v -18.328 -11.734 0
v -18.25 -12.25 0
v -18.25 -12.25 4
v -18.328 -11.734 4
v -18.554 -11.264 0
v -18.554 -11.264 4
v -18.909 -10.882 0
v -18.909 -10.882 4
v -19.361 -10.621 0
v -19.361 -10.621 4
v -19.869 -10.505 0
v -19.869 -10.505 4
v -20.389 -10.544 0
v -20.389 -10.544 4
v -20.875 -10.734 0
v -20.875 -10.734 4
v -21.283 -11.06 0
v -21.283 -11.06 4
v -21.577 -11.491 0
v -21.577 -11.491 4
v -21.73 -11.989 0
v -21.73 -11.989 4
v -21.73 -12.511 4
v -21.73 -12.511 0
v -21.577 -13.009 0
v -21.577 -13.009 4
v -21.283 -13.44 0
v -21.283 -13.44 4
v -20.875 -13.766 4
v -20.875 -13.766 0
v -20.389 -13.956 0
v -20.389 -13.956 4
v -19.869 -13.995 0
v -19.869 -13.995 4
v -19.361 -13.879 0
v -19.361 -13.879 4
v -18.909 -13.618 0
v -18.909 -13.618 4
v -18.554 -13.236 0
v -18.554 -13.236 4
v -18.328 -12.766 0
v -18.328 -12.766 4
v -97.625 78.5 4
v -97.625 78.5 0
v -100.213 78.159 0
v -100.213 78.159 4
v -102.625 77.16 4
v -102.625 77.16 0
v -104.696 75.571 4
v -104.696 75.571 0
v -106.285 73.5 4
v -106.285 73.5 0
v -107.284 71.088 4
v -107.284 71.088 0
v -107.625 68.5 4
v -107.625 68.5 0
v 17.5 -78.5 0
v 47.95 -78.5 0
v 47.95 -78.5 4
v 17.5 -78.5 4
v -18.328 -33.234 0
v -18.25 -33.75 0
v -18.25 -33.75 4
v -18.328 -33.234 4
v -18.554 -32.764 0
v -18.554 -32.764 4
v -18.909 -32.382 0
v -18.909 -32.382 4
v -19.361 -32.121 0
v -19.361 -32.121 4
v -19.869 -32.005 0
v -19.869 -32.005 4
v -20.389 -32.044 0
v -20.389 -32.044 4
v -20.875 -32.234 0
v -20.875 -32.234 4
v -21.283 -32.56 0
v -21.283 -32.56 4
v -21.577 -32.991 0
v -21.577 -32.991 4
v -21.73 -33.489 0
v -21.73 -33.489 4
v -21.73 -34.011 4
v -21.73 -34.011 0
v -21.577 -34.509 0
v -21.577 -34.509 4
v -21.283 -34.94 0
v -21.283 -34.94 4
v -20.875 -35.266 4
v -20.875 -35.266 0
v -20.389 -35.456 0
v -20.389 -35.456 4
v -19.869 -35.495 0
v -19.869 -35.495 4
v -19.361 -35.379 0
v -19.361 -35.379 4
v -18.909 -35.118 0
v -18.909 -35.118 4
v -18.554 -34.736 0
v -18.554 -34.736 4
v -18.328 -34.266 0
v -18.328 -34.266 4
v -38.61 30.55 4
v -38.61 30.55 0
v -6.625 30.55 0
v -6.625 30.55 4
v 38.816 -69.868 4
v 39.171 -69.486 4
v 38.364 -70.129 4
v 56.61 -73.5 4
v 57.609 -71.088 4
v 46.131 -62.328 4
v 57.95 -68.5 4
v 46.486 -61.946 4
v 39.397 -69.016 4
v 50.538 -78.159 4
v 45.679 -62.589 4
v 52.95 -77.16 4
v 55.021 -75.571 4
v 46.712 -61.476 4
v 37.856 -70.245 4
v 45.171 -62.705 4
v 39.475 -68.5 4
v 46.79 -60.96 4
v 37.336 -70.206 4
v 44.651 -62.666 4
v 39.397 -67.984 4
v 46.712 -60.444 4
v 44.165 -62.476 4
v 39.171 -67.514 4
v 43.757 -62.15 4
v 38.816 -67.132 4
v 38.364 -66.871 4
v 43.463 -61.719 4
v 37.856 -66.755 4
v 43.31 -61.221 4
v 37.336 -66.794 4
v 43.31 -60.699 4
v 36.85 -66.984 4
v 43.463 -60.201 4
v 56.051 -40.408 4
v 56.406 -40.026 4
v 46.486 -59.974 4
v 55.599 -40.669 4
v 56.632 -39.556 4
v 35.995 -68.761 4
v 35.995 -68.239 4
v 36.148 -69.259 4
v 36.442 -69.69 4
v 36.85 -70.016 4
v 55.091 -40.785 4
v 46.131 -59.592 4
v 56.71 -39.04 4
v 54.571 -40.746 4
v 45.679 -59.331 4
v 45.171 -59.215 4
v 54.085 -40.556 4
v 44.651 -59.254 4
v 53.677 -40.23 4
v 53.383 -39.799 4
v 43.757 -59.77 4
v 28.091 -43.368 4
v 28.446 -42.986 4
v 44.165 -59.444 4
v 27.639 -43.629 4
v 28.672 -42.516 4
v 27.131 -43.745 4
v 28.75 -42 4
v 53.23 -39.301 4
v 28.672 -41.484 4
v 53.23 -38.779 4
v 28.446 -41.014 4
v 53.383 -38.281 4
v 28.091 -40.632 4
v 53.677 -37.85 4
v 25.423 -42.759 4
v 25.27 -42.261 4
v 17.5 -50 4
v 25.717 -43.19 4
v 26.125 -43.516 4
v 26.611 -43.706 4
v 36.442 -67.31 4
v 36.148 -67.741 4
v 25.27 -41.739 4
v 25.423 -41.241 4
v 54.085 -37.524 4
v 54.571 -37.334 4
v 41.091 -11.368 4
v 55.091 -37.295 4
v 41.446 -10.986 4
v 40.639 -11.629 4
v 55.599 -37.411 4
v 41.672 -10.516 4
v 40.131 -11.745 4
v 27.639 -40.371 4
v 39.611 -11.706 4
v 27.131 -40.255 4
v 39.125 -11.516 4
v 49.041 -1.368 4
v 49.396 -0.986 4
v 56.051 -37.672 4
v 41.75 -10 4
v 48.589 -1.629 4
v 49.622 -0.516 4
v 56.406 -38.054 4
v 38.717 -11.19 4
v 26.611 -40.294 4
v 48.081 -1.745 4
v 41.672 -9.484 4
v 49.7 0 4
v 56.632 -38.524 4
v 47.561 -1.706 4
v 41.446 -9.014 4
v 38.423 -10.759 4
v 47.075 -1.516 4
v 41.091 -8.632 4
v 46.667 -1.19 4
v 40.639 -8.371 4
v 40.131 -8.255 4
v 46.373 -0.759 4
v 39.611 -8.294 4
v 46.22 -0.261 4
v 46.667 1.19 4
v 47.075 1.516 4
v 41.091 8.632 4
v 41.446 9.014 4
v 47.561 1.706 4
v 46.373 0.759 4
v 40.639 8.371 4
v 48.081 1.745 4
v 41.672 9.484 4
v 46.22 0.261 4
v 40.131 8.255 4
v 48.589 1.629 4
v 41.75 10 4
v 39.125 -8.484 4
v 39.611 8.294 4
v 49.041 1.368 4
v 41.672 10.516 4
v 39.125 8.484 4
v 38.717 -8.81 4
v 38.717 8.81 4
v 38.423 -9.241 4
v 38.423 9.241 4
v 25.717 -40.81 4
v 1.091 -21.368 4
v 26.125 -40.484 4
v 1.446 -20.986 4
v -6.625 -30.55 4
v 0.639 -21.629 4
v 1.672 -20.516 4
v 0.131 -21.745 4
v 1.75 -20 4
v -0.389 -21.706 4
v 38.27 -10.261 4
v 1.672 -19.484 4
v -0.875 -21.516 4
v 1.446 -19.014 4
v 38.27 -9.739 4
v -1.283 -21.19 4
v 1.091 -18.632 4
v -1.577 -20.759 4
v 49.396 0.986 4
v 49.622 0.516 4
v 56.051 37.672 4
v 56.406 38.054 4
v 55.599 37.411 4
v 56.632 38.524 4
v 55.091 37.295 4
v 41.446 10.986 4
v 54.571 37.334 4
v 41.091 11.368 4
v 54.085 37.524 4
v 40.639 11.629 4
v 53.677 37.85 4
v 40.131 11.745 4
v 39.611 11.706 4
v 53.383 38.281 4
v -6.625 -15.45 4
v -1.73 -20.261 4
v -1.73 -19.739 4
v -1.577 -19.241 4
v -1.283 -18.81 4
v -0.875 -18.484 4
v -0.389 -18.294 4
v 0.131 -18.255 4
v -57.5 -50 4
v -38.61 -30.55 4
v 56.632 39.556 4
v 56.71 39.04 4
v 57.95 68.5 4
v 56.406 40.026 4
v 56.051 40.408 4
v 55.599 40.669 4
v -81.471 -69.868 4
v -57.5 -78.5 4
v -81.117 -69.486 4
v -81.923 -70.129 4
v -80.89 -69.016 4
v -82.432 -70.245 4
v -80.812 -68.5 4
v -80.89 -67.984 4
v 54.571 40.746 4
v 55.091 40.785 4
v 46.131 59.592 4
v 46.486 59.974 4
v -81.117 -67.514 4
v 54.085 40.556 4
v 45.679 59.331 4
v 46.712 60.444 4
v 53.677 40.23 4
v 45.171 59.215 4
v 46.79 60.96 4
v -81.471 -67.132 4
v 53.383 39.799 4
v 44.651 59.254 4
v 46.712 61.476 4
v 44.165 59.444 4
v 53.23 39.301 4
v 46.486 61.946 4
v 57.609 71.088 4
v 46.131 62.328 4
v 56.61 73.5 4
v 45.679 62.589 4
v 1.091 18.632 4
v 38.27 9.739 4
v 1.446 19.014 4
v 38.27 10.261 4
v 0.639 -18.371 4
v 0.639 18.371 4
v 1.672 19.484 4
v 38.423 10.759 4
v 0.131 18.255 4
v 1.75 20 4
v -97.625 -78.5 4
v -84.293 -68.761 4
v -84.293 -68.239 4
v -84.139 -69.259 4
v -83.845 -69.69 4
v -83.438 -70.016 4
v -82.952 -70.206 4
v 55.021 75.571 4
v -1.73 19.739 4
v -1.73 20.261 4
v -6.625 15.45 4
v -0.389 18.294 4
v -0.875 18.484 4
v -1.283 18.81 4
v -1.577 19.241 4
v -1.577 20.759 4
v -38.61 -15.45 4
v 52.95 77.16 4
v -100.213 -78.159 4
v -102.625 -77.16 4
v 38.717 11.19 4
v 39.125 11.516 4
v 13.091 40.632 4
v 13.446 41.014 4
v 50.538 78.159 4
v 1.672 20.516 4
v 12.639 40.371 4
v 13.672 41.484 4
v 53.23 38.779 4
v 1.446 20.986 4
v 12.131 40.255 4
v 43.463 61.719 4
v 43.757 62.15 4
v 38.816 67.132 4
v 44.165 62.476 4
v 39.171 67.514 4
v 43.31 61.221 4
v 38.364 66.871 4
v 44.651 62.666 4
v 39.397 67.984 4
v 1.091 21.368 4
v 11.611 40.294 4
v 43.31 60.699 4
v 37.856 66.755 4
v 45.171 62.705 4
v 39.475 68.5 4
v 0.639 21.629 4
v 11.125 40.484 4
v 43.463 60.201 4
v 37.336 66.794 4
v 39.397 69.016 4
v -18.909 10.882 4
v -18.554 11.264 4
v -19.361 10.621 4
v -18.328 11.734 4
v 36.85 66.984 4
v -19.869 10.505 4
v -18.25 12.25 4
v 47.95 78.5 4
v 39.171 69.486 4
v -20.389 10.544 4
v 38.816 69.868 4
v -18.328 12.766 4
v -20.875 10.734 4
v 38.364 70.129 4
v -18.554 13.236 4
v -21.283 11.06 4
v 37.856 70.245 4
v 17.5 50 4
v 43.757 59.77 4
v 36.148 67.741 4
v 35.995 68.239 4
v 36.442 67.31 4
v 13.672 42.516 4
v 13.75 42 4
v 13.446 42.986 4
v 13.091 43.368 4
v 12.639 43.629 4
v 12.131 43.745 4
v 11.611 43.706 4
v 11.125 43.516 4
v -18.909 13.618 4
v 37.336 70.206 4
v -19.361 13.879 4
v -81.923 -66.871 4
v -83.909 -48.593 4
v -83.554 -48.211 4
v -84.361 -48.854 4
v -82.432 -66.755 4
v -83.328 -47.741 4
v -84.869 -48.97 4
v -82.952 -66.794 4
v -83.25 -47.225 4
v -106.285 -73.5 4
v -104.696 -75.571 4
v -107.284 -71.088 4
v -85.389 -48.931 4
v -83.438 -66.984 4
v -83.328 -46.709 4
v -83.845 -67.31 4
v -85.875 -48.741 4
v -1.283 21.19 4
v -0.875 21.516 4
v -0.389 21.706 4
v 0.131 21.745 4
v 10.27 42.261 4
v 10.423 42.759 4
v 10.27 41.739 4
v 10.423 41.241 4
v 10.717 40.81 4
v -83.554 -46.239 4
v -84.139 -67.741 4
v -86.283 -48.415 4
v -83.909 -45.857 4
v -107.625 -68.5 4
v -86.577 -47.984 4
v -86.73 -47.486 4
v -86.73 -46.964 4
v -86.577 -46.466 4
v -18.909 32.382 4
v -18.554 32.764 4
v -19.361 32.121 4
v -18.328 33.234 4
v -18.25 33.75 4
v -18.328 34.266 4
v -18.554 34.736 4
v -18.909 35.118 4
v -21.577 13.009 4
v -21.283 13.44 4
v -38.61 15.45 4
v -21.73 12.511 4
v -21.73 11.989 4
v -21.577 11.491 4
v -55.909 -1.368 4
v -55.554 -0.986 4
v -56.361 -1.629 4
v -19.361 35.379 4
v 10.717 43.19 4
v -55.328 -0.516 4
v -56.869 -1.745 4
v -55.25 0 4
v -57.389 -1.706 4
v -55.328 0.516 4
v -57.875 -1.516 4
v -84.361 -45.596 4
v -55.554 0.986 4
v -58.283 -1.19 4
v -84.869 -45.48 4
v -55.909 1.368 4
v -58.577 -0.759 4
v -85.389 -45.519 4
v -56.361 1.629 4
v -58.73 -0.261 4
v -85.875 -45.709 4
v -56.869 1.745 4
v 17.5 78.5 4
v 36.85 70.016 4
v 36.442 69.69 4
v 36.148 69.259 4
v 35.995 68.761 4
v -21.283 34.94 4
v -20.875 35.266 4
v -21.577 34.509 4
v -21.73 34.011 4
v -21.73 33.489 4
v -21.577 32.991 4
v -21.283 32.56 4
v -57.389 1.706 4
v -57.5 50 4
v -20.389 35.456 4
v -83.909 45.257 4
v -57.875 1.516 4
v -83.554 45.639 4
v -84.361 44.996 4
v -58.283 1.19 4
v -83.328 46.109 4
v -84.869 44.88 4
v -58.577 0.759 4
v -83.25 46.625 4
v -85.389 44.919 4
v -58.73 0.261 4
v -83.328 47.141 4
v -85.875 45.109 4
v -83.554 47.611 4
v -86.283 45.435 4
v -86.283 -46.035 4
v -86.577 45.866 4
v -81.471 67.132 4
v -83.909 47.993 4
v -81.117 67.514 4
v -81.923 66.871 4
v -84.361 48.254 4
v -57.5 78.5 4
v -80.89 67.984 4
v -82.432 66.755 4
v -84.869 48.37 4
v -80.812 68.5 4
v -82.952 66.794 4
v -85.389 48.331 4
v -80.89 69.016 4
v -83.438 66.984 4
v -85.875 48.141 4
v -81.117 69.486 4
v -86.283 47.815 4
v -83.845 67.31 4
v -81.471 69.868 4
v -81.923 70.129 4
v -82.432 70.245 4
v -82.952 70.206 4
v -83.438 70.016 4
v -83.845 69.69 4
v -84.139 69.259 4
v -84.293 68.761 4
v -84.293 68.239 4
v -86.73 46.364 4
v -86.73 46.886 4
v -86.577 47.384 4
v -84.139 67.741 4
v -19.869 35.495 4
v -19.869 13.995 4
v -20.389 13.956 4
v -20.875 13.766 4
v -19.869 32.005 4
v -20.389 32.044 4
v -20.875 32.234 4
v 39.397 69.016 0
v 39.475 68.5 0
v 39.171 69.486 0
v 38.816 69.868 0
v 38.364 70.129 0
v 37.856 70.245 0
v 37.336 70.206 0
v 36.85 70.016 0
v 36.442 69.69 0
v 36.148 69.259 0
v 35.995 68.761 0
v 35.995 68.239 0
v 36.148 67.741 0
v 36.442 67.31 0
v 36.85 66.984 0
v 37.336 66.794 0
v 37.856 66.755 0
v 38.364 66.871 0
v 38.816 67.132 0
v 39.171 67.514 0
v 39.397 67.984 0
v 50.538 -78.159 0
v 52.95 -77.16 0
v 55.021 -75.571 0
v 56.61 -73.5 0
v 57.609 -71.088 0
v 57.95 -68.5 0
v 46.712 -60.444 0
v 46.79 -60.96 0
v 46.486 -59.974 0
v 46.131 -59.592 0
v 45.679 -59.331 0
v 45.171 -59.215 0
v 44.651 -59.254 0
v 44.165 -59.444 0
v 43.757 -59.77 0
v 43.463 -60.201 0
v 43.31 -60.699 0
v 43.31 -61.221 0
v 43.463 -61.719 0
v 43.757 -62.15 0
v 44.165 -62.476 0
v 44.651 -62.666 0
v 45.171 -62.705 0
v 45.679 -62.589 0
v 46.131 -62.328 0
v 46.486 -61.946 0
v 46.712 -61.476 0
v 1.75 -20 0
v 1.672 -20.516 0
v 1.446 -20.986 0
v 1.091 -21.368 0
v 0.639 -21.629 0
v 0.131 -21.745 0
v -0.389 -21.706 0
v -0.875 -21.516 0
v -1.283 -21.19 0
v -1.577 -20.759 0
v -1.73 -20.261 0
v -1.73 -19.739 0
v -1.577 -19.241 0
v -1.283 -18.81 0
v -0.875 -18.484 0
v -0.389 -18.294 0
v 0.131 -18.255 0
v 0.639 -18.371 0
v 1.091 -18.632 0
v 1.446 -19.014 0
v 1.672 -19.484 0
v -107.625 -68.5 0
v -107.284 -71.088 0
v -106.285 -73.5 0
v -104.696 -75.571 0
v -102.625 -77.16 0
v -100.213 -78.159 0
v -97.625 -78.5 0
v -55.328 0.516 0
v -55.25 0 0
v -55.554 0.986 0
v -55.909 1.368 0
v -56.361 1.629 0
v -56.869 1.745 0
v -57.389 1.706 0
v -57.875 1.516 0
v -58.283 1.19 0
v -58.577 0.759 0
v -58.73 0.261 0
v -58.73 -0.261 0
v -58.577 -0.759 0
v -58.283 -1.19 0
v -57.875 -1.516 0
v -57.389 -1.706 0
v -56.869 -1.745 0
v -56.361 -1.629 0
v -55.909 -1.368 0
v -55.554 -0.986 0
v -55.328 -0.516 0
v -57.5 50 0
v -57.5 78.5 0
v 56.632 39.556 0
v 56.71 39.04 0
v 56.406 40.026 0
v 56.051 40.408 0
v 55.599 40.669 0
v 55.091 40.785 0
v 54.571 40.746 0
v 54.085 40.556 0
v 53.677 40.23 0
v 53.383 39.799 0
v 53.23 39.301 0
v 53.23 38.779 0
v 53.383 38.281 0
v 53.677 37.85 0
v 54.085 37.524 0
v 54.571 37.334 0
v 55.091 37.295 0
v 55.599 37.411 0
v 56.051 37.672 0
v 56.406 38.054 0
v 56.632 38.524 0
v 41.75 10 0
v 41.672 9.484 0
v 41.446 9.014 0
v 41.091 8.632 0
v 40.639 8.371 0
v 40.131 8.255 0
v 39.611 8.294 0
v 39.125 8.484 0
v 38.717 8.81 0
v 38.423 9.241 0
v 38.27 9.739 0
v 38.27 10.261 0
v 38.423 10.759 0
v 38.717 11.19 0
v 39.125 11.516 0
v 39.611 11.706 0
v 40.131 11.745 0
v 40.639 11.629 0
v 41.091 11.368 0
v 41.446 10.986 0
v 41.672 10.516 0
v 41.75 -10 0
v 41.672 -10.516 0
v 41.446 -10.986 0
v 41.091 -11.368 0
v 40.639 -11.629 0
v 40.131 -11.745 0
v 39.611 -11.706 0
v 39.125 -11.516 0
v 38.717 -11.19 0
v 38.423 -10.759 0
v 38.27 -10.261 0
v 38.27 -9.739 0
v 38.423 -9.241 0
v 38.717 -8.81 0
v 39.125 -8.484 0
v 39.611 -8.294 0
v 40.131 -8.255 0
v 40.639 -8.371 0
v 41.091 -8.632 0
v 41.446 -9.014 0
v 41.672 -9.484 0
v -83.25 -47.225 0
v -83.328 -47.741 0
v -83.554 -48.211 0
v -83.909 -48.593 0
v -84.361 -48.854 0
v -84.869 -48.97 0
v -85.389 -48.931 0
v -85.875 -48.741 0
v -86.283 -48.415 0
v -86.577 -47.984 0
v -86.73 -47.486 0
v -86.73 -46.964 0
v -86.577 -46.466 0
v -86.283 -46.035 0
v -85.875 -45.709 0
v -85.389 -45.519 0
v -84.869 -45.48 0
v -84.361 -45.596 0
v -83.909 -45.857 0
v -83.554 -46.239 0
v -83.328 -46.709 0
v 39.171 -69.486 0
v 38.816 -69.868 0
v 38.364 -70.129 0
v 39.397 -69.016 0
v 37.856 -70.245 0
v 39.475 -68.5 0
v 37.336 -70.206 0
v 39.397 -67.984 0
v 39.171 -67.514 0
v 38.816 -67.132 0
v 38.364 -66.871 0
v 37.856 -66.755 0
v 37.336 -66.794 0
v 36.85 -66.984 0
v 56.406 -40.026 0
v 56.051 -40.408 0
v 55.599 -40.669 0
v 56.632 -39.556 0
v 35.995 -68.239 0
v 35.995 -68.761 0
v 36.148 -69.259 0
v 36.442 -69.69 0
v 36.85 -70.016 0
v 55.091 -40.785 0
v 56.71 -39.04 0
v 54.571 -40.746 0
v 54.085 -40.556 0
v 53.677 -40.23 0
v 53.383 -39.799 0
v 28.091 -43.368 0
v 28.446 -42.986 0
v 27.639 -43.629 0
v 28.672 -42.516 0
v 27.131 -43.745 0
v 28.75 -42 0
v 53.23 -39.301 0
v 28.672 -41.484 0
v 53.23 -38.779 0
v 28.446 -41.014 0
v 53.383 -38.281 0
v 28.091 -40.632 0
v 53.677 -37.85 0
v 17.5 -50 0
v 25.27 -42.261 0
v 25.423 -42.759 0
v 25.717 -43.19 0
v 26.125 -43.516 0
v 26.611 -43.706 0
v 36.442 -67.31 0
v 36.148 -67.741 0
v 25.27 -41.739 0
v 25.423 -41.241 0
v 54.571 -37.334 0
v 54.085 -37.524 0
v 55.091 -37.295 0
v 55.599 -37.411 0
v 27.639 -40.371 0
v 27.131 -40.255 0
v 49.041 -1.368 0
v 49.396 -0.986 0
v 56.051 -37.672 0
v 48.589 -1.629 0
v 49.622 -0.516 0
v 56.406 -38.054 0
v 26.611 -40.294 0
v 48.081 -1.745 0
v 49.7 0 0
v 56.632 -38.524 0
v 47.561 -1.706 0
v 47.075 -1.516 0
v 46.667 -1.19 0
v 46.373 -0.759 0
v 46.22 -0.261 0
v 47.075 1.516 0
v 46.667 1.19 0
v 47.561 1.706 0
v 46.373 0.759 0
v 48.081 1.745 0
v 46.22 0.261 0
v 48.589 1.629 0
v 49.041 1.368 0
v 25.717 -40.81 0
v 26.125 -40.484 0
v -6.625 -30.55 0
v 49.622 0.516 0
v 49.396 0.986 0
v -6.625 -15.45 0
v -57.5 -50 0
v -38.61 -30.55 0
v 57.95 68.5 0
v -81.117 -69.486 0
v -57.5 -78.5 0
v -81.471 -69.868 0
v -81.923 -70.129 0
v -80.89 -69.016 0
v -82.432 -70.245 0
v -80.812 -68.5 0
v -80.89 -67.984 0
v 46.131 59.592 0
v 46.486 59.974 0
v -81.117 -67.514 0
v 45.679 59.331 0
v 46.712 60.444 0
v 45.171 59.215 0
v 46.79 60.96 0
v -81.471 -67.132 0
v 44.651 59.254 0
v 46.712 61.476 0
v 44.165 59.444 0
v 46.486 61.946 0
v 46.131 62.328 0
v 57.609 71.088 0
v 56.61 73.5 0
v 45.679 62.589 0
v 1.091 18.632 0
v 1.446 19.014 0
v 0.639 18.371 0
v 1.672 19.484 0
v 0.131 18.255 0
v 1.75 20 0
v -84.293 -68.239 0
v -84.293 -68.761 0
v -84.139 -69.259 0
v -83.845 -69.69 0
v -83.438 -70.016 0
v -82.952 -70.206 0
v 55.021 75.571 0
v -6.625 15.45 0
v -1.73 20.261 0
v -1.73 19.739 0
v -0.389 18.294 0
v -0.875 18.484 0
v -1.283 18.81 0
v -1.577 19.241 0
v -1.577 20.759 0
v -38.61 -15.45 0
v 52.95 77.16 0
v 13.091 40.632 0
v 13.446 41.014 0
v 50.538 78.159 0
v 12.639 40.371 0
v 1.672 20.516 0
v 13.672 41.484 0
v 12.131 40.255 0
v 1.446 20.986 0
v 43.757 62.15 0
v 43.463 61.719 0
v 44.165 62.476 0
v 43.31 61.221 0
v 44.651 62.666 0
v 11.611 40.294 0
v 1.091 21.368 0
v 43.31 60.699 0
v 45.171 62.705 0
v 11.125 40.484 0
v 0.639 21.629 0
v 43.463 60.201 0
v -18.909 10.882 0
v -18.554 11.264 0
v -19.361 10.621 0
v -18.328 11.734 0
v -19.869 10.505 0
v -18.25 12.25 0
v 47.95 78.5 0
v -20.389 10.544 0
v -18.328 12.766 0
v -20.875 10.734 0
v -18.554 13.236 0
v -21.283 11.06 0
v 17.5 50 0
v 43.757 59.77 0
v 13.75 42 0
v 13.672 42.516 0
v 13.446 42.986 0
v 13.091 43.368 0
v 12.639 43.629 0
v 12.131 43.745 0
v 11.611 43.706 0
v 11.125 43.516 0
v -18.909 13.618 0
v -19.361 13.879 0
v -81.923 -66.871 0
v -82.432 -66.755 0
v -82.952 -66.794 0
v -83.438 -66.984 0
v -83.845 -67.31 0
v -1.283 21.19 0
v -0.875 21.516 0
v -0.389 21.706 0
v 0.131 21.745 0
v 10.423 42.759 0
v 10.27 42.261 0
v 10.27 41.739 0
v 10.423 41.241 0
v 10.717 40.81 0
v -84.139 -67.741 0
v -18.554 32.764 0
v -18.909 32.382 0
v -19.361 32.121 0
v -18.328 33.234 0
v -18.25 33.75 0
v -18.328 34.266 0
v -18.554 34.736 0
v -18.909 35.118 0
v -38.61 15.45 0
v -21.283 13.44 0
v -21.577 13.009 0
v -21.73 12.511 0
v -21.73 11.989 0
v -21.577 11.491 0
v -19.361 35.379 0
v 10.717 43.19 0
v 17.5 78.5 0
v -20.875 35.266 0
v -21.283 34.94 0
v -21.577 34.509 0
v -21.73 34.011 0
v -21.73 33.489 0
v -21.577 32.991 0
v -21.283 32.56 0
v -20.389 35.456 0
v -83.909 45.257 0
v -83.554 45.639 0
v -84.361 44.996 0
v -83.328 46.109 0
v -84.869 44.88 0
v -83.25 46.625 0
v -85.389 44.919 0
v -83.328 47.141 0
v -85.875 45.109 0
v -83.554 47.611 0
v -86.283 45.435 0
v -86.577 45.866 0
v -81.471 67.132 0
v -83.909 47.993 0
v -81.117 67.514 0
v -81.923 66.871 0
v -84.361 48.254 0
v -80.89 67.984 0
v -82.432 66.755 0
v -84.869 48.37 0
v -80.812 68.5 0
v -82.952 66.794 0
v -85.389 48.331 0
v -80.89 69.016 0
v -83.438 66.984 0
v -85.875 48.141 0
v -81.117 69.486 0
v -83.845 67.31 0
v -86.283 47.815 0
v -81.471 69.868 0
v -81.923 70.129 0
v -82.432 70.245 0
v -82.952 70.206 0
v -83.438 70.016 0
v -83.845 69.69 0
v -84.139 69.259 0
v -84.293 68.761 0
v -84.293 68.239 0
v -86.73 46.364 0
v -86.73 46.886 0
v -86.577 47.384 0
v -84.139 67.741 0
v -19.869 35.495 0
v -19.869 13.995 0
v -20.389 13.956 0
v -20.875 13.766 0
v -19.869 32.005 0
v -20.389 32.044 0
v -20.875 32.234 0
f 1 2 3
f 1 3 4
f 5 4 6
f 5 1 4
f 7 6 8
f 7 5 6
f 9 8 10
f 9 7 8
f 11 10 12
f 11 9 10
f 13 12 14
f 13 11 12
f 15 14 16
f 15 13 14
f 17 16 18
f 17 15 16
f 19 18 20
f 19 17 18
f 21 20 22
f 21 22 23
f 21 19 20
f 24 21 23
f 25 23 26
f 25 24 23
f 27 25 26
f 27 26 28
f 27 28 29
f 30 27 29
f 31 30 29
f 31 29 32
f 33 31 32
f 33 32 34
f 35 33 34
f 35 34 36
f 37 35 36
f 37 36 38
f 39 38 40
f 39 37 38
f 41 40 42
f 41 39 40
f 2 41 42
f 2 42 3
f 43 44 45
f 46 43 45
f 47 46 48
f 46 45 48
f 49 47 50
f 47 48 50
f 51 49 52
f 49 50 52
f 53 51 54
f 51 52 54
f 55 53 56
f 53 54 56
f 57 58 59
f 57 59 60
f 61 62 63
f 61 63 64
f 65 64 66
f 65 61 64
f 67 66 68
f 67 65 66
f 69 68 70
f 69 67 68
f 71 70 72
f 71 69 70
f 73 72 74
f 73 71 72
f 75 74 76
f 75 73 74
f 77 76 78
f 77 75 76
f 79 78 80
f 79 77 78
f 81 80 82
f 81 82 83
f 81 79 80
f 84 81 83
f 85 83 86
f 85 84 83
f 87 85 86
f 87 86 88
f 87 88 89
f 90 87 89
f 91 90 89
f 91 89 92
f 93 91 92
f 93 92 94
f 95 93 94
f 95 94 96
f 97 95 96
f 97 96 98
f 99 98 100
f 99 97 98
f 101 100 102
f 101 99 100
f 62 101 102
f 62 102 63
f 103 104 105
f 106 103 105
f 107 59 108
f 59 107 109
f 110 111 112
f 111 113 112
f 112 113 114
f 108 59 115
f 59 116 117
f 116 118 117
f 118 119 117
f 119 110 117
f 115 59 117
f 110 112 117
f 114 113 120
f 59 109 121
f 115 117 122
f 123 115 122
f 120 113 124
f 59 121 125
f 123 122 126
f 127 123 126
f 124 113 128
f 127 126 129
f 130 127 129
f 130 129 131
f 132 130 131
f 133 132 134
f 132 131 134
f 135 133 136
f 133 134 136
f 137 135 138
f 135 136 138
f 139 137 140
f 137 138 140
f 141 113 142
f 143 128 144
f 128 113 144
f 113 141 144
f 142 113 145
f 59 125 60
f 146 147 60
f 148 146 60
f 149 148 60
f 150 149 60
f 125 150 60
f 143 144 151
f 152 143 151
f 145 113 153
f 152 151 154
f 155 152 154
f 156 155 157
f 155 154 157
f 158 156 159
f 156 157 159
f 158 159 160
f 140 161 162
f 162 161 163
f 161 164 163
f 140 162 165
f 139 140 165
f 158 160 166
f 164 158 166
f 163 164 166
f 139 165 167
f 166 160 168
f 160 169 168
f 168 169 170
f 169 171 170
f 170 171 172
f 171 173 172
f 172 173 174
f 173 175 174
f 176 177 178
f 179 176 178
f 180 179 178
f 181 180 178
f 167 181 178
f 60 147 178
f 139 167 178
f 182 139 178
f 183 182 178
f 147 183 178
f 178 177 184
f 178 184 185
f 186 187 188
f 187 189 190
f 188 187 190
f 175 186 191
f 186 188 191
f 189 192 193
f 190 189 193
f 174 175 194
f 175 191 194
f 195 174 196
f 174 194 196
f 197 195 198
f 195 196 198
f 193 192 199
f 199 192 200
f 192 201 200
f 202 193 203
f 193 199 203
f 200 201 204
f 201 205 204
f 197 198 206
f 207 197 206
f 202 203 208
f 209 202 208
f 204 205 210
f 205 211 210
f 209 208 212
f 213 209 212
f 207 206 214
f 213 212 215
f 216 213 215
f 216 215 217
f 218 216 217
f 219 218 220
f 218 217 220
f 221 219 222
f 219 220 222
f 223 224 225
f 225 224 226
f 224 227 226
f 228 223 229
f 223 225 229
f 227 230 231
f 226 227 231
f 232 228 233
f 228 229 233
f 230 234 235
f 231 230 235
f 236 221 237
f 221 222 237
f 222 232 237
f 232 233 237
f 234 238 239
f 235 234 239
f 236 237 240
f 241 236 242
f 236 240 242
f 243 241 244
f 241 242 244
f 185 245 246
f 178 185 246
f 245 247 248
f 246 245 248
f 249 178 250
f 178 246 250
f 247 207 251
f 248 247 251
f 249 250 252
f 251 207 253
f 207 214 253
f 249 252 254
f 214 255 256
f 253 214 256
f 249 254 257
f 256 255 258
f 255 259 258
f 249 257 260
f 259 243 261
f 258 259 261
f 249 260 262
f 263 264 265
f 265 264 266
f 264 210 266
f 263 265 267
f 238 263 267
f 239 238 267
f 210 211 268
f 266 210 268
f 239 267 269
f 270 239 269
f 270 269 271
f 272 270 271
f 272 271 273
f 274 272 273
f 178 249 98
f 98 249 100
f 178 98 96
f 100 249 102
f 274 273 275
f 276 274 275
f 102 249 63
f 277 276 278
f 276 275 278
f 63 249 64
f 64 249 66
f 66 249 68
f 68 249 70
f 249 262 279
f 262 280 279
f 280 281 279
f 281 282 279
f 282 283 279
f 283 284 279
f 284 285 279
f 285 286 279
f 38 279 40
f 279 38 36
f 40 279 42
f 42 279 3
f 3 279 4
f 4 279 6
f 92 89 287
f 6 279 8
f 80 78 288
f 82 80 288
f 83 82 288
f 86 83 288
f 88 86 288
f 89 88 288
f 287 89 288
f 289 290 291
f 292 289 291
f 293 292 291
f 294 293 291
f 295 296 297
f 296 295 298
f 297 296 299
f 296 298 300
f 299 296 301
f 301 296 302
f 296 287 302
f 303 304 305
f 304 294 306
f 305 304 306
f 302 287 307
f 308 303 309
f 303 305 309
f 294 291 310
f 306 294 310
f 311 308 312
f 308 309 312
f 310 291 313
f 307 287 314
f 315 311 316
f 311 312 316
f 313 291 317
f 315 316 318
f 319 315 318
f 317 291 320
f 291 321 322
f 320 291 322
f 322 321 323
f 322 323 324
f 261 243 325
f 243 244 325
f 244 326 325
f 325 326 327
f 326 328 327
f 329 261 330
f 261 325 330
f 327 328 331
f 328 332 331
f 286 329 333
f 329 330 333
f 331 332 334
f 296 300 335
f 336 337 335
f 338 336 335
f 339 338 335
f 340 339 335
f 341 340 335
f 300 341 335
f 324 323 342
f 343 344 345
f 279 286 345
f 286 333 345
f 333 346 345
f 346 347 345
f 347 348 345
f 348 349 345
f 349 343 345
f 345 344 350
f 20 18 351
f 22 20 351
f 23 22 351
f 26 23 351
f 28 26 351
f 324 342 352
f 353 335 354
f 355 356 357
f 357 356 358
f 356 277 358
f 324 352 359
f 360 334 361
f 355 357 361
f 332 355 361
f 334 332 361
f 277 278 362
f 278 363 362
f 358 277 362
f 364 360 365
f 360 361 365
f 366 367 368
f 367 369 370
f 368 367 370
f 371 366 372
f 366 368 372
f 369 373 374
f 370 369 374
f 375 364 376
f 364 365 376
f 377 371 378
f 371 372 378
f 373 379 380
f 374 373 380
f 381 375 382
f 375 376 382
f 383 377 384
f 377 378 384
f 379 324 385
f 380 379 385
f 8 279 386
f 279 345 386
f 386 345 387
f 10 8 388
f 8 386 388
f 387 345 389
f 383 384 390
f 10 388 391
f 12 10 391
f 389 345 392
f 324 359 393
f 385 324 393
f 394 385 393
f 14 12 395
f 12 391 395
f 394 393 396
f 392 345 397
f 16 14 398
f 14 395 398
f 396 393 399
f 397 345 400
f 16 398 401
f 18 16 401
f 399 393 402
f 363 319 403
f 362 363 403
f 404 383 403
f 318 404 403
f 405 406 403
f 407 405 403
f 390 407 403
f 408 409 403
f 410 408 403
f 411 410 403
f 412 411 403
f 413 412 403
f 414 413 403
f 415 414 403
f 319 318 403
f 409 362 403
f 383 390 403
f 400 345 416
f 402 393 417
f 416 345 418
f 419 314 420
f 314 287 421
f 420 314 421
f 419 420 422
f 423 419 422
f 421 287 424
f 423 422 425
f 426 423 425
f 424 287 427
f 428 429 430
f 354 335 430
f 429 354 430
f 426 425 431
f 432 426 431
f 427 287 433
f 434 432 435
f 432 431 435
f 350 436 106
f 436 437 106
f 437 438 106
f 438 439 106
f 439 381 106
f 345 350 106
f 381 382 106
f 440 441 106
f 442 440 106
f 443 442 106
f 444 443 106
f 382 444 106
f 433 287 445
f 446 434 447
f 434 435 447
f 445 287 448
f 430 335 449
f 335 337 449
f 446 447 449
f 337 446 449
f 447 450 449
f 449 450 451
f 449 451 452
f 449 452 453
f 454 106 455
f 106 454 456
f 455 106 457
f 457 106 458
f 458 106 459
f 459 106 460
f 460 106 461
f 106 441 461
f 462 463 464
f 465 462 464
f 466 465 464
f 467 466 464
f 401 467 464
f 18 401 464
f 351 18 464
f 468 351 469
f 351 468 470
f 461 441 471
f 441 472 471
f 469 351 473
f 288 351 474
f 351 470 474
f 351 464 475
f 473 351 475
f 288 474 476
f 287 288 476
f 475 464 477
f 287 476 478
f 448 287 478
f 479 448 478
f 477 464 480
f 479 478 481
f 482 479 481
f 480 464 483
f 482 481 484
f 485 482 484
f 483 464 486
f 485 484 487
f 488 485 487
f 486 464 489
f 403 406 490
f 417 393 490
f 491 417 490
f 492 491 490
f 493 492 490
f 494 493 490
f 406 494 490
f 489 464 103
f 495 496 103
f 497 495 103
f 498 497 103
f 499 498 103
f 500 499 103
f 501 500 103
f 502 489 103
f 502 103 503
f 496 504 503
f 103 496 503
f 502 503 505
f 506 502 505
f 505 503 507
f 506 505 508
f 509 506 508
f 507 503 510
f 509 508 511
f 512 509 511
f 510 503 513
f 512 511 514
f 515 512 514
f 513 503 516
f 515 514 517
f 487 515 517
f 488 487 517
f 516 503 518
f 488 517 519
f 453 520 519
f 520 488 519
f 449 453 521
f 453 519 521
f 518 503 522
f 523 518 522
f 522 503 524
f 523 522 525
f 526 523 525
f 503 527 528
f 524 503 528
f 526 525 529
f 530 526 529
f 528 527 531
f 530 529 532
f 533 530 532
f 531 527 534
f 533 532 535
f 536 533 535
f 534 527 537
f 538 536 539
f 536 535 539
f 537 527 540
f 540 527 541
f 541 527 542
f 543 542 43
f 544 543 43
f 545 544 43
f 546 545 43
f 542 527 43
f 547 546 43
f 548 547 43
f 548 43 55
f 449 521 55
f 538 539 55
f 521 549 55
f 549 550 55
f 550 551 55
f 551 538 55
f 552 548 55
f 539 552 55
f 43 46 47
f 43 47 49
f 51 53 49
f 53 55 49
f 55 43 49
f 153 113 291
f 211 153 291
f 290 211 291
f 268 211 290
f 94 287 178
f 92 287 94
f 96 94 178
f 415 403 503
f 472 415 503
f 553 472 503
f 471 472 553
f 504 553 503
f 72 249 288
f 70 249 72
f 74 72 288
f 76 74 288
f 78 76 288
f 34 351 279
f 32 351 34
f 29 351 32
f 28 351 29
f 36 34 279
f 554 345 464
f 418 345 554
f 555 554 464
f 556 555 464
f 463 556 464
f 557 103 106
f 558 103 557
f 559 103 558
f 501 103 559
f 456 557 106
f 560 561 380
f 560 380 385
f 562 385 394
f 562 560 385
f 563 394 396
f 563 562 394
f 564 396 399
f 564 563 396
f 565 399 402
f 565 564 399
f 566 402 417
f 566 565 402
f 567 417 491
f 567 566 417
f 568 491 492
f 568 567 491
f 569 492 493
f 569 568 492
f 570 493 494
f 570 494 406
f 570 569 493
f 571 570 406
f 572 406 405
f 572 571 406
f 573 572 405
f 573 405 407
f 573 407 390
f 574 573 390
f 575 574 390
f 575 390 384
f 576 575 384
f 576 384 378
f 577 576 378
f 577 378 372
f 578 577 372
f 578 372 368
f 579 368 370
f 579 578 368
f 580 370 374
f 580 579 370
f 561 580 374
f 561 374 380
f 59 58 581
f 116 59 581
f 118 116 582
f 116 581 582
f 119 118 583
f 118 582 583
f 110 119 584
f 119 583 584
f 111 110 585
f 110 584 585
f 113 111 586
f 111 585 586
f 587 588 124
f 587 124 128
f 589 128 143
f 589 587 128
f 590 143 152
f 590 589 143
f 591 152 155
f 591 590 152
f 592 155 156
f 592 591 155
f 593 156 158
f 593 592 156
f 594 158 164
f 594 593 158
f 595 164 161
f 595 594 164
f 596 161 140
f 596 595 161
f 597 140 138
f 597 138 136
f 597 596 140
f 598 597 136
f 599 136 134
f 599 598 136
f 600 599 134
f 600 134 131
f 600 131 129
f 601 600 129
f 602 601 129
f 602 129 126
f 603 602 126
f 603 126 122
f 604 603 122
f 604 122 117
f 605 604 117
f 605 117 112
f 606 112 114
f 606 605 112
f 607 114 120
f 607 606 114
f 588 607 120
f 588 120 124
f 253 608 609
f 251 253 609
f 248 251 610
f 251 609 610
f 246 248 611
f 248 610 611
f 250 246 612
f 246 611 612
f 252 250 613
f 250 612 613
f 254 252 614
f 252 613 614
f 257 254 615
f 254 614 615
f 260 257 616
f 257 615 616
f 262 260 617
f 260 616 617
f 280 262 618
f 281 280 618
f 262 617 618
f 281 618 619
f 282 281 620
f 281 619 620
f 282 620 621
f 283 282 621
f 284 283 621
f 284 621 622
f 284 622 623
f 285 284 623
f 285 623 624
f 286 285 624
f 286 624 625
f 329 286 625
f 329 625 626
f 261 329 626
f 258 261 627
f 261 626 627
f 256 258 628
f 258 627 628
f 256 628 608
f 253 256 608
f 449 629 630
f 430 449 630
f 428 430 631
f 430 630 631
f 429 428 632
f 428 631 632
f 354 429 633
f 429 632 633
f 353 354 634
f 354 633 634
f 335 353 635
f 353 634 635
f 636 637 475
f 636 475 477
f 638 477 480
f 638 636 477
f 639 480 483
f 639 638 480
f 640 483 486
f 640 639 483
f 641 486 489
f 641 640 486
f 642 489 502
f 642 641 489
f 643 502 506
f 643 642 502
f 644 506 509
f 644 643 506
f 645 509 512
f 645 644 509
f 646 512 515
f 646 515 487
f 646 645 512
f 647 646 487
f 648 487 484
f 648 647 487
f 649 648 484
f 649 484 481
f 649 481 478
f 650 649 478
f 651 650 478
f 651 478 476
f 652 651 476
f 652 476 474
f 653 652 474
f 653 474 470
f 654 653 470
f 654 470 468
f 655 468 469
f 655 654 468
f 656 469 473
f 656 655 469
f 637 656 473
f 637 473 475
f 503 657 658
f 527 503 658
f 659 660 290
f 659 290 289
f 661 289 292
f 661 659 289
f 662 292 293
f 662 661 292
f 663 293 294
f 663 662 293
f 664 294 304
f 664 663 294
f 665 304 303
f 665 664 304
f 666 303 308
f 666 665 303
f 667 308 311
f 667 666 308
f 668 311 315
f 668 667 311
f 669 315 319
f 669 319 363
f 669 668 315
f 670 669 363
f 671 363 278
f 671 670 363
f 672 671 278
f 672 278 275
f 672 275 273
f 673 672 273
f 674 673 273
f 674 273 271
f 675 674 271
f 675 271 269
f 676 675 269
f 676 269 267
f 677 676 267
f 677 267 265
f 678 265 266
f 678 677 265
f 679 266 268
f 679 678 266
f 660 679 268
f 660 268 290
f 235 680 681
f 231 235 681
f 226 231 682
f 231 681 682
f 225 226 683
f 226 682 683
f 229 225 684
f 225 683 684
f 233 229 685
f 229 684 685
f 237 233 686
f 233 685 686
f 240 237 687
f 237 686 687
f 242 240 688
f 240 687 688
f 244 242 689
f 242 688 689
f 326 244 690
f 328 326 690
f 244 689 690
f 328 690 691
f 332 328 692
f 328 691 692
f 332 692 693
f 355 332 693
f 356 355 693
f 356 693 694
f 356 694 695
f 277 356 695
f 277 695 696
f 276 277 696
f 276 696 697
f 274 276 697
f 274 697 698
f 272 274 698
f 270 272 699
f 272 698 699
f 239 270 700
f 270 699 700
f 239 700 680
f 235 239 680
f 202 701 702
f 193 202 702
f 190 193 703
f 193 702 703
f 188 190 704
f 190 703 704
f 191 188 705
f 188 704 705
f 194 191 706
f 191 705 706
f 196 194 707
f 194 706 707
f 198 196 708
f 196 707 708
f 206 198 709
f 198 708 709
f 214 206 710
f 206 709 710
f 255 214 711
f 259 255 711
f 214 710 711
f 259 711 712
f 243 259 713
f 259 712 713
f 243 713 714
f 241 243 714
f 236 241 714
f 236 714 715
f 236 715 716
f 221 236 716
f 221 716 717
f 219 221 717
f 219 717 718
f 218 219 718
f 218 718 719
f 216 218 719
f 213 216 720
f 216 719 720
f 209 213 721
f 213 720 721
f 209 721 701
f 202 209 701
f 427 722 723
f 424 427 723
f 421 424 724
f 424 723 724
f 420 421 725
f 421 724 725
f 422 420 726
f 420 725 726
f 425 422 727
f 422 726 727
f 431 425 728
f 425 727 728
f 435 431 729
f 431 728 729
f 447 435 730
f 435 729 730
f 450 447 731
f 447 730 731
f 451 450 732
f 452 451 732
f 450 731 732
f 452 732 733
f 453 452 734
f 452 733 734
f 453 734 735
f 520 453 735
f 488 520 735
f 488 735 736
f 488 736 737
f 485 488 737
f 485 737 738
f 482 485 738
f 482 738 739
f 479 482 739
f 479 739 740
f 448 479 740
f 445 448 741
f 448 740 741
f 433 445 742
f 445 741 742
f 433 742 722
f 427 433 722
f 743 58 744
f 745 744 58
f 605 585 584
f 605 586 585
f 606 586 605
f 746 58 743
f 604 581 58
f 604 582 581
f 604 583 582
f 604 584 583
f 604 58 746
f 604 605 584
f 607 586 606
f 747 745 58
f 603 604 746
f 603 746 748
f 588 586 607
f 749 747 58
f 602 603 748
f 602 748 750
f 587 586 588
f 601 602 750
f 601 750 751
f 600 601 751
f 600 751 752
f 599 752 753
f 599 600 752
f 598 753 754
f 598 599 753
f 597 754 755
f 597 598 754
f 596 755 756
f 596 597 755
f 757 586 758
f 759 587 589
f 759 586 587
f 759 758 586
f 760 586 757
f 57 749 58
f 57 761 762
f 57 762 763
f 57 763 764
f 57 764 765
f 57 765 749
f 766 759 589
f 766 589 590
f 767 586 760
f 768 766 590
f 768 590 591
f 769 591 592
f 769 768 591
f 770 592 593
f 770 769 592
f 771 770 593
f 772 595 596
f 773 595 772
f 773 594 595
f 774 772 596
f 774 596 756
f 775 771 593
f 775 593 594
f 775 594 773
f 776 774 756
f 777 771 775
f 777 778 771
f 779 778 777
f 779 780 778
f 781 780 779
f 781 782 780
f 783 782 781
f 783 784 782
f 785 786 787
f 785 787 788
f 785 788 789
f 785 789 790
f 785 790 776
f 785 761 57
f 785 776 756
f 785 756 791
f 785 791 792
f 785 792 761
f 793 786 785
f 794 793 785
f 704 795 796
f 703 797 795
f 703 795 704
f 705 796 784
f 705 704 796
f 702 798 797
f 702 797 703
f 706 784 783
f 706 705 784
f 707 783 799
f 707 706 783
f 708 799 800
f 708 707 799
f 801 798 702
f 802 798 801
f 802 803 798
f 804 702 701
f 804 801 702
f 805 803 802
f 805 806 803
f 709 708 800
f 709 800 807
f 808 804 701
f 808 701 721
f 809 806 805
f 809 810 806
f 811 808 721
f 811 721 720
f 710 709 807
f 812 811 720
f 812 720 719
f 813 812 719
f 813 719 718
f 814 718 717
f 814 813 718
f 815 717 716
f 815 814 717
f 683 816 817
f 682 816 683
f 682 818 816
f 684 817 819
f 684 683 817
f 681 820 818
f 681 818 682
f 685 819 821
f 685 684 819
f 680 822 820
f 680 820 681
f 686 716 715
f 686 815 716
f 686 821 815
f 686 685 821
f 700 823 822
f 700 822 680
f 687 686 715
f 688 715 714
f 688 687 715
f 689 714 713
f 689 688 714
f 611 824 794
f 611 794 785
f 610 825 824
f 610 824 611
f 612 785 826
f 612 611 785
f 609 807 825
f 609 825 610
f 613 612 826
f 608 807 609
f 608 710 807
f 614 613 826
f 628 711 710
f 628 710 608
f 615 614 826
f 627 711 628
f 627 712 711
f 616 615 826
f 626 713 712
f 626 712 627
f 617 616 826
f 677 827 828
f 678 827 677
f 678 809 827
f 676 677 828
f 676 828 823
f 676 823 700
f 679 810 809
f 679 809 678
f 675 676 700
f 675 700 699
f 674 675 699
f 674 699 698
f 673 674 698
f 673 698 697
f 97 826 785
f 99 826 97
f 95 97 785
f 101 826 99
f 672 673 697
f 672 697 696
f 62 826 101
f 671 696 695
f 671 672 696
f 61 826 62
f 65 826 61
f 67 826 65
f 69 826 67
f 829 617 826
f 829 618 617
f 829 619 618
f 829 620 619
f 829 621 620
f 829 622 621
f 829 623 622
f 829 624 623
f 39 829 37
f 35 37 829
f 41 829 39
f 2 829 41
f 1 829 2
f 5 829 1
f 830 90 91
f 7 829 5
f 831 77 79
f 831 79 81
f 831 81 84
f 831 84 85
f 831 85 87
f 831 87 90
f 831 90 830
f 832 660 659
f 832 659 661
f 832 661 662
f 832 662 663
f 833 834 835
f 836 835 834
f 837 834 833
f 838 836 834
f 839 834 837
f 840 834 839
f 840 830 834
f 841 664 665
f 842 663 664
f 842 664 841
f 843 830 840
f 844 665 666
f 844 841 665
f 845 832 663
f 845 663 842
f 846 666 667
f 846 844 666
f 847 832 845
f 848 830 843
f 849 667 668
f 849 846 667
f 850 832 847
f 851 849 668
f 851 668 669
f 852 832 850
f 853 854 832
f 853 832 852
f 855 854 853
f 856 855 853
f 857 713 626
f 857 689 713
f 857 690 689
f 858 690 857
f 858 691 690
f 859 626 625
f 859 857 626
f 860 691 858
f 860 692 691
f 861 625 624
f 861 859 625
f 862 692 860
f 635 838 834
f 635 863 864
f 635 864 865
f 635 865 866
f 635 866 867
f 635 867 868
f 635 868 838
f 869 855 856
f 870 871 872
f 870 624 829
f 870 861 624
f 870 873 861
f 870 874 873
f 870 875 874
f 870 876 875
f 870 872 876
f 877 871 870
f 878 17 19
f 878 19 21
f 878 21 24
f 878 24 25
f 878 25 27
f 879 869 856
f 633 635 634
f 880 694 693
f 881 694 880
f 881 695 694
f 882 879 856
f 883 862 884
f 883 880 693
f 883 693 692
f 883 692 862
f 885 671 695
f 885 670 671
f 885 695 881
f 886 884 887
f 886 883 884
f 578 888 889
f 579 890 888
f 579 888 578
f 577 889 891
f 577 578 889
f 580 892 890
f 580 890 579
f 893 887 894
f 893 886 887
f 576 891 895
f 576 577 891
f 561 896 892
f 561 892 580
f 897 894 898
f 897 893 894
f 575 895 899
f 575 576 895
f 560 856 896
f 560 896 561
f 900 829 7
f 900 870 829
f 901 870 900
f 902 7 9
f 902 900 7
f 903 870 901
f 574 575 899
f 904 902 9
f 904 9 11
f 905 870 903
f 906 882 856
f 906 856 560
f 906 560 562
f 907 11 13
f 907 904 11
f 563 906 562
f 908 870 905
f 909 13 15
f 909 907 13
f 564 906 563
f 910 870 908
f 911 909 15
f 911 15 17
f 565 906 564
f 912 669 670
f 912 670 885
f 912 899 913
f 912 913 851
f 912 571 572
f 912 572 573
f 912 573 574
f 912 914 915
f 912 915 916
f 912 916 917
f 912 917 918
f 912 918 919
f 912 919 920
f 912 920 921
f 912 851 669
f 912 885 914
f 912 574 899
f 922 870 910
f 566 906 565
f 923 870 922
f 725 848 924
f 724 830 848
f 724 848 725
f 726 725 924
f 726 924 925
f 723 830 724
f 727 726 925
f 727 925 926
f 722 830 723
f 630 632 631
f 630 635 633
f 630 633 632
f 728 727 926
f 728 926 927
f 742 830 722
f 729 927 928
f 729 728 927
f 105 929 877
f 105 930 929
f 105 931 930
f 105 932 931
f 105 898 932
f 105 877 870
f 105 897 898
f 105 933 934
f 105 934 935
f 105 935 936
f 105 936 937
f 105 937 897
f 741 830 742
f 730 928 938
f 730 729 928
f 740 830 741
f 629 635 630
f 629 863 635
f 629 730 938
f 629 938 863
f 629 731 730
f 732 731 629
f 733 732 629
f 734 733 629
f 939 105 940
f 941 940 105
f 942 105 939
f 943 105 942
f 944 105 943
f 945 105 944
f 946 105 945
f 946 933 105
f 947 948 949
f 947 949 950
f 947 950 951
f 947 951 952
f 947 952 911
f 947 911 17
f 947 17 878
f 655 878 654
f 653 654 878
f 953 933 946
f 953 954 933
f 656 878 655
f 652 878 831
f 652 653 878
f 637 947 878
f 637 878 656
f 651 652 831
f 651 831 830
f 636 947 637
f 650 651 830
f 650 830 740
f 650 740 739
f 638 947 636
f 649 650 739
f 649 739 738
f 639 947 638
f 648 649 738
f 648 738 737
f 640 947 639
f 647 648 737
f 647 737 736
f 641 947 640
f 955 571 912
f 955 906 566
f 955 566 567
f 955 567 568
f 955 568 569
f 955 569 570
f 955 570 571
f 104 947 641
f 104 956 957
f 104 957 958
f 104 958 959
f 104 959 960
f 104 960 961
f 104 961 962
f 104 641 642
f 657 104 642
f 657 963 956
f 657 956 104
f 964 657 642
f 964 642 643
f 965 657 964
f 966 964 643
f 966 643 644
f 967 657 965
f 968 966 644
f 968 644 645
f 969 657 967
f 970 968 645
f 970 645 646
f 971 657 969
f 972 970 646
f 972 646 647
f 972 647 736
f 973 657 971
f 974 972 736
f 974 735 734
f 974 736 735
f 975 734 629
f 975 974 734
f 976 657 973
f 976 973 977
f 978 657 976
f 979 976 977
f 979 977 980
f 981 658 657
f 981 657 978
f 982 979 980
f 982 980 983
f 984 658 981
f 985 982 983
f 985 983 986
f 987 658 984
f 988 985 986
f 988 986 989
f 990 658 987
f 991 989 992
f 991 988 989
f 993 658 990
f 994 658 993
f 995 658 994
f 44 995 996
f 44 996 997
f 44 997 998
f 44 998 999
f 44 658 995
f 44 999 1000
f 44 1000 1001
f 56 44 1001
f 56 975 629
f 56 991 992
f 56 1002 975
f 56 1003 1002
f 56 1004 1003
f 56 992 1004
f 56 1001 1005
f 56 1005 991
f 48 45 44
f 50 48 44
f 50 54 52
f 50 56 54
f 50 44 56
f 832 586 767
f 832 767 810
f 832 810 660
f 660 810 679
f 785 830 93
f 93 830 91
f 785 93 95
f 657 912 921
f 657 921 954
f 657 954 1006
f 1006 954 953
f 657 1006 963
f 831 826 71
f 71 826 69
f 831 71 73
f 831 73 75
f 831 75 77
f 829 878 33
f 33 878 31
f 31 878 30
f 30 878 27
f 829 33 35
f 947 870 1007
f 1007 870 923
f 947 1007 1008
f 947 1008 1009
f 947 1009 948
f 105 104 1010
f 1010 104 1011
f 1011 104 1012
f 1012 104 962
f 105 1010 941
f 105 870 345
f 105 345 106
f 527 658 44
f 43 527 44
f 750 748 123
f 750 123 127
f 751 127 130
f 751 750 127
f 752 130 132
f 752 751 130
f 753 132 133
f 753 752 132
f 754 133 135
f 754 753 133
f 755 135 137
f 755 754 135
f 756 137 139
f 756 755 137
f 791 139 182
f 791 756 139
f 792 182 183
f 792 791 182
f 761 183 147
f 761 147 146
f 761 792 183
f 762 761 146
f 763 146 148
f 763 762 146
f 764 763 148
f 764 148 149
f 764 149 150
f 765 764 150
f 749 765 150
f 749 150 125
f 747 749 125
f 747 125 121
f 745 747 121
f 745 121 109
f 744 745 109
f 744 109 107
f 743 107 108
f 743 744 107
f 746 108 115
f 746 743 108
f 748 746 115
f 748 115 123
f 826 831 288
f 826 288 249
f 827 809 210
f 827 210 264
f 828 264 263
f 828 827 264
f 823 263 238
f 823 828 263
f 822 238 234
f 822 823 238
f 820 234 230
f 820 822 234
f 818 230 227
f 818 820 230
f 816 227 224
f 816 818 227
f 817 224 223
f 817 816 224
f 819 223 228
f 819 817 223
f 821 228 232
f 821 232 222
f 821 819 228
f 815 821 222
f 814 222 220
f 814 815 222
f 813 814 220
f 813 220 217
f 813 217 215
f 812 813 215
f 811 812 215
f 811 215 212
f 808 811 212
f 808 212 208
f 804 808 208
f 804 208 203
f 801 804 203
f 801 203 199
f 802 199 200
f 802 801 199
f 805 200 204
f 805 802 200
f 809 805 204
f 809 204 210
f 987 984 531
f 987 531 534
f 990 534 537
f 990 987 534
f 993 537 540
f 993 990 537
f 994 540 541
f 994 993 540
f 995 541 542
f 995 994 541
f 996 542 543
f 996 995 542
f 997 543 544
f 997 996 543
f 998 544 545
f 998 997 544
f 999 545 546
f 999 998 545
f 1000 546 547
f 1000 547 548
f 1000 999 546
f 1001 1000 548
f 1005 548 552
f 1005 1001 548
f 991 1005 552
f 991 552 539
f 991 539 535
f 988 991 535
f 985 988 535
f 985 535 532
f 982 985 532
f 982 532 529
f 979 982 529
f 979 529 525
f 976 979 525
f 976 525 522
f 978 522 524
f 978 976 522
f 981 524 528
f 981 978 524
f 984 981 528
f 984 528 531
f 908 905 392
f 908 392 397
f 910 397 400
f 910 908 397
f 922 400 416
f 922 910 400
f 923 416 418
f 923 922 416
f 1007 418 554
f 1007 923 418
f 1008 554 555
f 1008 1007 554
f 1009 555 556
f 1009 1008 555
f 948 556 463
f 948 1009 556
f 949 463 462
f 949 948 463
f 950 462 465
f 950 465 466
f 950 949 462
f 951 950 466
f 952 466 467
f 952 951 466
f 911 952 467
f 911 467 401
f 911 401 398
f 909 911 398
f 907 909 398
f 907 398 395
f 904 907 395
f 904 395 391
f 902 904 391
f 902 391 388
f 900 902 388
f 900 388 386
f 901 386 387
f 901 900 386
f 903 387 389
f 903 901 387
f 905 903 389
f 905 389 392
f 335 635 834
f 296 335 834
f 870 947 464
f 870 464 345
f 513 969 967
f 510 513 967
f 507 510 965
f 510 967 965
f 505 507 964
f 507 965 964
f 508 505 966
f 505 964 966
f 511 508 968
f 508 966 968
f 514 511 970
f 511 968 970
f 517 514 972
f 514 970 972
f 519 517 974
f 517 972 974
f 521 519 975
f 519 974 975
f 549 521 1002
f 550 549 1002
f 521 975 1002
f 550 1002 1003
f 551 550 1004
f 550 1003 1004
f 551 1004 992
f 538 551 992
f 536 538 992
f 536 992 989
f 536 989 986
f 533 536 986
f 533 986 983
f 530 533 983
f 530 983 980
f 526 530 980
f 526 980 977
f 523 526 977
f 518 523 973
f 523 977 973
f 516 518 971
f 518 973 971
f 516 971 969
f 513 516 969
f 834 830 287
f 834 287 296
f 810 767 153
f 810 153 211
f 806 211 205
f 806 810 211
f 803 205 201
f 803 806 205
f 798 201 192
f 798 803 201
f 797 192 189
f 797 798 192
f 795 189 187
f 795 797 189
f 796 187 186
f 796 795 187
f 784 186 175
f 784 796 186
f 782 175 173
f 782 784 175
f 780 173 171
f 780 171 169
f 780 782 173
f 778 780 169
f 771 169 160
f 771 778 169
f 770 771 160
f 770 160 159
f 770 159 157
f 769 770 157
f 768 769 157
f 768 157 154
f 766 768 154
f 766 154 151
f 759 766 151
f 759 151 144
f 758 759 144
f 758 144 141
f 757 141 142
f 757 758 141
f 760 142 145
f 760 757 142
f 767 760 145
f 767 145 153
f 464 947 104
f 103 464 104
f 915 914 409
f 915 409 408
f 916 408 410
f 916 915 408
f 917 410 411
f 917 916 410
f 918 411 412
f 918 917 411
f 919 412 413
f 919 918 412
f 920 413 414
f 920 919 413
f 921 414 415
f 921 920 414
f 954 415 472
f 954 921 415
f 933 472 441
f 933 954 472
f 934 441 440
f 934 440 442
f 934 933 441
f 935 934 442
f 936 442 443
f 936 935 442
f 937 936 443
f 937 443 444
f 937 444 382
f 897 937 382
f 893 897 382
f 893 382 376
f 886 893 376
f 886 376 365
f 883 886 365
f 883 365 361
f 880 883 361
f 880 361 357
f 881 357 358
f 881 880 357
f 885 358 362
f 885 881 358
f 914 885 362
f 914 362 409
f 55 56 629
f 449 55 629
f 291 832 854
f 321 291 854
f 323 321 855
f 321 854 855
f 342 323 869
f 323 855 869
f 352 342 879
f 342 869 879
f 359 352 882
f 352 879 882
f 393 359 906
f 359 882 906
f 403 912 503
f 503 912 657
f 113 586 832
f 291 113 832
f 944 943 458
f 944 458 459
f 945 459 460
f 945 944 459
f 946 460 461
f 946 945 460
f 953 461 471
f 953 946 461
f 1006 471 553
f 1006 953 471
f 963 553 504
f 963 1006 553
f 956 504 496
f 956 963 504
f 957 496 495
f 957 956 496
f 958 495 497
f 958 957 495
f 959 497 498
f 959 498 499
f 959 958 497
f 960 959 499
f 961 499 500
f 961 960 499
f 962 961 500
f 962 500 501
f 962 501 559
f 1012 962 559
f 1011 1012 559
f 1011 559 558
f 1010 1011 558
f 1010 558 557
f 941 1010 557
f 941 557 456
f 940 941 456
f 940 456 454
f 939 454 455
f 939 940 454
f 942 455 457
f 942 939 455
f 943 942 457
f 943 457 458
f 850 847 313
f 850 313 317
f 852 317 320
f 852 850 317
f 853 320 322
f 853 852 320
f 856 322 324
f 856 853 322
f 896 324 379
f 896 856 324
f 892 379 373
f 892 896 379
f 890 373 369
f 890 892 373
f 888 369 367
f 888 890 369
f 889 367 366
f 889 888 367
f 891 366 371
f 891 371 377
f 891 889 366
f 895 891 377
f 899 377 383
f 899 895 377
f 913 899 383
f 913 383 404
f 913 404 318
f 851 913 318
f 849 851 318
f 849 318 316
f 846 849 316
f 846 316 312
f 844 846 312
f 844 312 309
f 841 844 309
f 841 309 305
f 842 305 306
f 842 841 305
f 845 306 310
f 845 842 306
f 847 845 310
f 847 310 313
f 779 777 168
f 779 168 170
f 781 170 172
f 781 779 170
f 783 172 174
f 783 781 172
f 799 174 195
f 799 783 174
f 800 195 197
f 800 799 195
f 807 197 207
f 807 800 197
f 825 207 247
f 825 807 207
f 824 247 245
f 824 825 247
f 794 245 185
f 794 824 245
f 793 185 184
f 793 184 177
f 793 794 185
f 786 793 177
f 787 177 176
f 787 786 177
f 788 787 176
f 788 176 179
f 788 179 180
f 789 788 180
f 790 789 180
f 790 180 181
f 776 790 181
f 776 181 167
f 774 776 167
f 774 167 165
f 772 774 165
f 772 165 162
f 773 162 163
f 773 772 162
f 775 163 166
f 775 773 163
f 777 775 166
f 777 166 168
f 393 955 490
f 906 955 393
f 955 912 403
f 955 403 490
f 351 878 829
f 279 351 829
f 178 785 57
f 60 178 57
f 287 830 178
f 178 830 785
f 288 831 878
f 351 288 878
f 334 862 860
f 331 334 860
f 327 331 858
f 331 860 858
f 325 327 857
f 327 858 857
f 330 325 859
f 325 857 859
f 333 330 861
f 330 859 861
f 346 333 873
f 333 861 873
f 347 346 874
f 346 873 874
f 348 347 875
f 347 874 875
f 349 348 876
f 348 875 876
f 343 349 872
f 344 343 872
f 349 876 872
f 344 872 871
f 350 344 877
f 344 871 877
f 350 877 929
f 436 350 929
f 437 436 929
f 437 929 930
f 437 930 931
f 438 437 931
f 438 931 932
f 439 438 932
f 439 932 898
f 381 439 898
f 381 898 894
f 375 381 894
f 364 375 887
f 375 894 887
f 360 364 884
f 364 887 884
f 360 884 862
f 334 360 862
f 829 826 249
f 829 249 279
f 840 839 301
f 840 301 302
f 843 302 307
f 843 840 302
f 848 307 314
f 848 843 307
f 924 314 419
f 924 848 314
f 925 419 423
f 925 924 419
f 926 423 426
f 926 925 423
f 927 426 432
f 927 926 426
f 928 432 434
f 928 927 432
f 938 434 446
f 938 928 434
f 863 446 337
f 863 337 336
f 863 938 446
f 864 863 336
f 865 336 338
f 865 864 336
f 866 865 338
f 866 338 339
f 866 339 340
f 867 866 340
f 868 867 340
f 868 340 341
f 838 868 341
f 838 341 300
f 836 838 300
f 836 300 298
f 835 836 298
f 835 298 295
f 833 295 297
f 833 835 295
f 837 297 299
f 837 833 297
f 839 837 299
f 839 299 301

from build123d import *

# Parameters (mm, degrees)
SKETCH043_R     = 1.75
SKETCH043_W     = 31.985
SKETCH043_H     = 15.1
PAD030_DEPTH    = 4
SKETCH063_R     = 1.75
POCKET011_DEPTH = 4
SKETCH076_R     = 1.75
POCKET014_DEPTH = 4
SKETCH081_R     = 1.75
POCKET016_DEPTH = 4


with BuildPart() as part:
    # Sketch043 → Pad030 (new body)
    with BuildSketch(Plane.XY):
        with BuildLine():
            Line((17.5, 50), (17.5, 78.5))
            Line((17.5, 78.5), (37.725, 78.5))
            Line((37.725, 78.5), (47.95, 78.5))
            ThreePointArc((57.95, 68.5), (55.021068, 75.571068), (47.95, 78.5))
            Line((57.95, 0), (57.95, 68.5))
            Line((57.95, -68.5), (57.95, 0))
            ThreePointArc((47.95, -78.5), (55.021068, -75.571068), (57.95, -68.5))
            Line((47.95, -78.5), (37.725, -78.5))
            Line((37.725, -78.5), (17.5, -78.5))
            Line((17.5, -50), (17.5, -78.5))
            Line((-57.5, -50), (17.5, -50))
            Line((-57.5, -50), (-57.5, -78.5))
            Line((-82.5625, -78.5), (-57.5, -78.5))
            Line((-97.625, -78.5), (-82.5625, -78.5))
            ThreePointArc((-107.625, -68.5), (-104.696068, -75.571068), (-97.625, -78.5))
            Line((-107.625, 68.500006), (-107.625, -68.5))
            ThreePointArc((-97.625, 78.5), (-104.696066, 75.57107), (-107.625, 68.500006))
            Line((-97.625, 78.5), (-82.5625, 78.5))
            Line((-57.5, 78.5), (-82.5625, 78.5))
            Line((-57.5, 50), (-57.5, 78.5))
            Line((17.5, 50), (-57.5, 50))
        make_face()
        with Locations((45.04, 60.96)):
            Circle(SKETCH043_R, mode=Mode.SUBTRACT)
        with Locations((54.96, 39.04)):
            Circle(SKETCH043_R, mode=Mode.SUBTRACT)
        with Locations((27, -42)):
            Circle(SKETCH043_R, mode=Mode.SUBTRACT)
        with Locations((12, 42)):
            Circle(SKETCH043_R, mode=Mode.SUBTRACT)
        with Locations((-57, 0)):
            Circle(SKETCH043_R, mode=Mode.SUBTRACT)
        with Locations((-20, -33.75)):
            Circle(SKETCH043_R, mode=Mode.SUBTRACT)
        with Locations((-20, -12.25)):
            Circle(SKETCH043_R, mode=Mode.SUBTRACT)
        with Locations((-20, 12.25)):
            Circle(SKETCH043_R, mode=Mode.SUBTRACT)
        with Locations((-20, 33.75)):
            Circle(SKETCH043_R, mode=Mode.SUBTRACT)
        with Locations((54.96, -39.04)):
            Circle(SKETCH043_R, mode=Mode.SUBTRACT)
        with Locations((45.04, -60.96)):
            Circle(SKETCH043_R, mode=Mode.SUBTRACT)
        with Locations((37.725, 68.5)):
            Circle(SKETCH043_R, mode=Mode.SUBTRACT)
        with Locations((47.95, 0)):
            Circle(SKETCH043_R, mode=Mode.SUBTRACT)
        with Locations((37.725, -68.5)):
            Circle(SKETCH043_R, mode=Mode.SUBTRACT)
        with Locations((-82.5625, -68.5)):
            Circle(SKETCH043_R, mode=Mode.SUBTRACT)
        with Locations((-82.5625, 68.5)):
            Circle(SKETCH043_R, mode=Mode.SUBTRACT)
        with Locations((-22.6175, 23)):
            Rectangle(SKETCH043_W, SKETCH043_H, mode=Mode.SUBTRACT)
        with Locations((-22.6175, -23)):
            Rectangle(SKETCH043_W, SKETCH043_H, mode=Mode.SUBTRACT)
    extrude(amount=PAD030_DEPTH)

    # Sketch063 → Pocket011 (cut)
    with BuildSketch(Plane(origin=(0, 0, 0), x_dir=(1, 0, 0), z_dir=(0, 0, -1))):
        with Locations((-85, 47.225)):
            Circle(SKETCH063_R)
        with Locations((-85, -46.625)):
            Circle(SKETCH063_R)
    extrude(amount=-POCKET011_DEPTH, mode=Mode.SUBTRACT)

    # Sketch076 (on Face4 of Pocket011) → Pocket014 (cut)
    with BuildSketch(Plane(origin=(0, 0, 0), x_dir=(1, 0, 0), z_dir=(0, 0, -1))):
        with Locations((40, 10)):
            Circle(SKETCH076_R)
        with Locations((40, -10)):
            Circle(SKETCH076_R)
    extrude(amount=-POCKET014_DEPTH, mode=Mode.SUBTRACT)

    # Sketch081 (on Face4 of Pocket014) → Pocket016 (cut)
    with BuildSketch(Plane(origin=(0, 0, 0), x_dir=(1, 0, 0), z_dir=(0, 0, -1))):
        with Locations((0, 20)):
            Circle(SKETCH081_R)
        with Locations((0, -20)):
            Circle(SKETCH081_R)
    extrude(amount=-POCKET016_DEPTH, mode=Mode.SUBTRACT)


solid = part.part
